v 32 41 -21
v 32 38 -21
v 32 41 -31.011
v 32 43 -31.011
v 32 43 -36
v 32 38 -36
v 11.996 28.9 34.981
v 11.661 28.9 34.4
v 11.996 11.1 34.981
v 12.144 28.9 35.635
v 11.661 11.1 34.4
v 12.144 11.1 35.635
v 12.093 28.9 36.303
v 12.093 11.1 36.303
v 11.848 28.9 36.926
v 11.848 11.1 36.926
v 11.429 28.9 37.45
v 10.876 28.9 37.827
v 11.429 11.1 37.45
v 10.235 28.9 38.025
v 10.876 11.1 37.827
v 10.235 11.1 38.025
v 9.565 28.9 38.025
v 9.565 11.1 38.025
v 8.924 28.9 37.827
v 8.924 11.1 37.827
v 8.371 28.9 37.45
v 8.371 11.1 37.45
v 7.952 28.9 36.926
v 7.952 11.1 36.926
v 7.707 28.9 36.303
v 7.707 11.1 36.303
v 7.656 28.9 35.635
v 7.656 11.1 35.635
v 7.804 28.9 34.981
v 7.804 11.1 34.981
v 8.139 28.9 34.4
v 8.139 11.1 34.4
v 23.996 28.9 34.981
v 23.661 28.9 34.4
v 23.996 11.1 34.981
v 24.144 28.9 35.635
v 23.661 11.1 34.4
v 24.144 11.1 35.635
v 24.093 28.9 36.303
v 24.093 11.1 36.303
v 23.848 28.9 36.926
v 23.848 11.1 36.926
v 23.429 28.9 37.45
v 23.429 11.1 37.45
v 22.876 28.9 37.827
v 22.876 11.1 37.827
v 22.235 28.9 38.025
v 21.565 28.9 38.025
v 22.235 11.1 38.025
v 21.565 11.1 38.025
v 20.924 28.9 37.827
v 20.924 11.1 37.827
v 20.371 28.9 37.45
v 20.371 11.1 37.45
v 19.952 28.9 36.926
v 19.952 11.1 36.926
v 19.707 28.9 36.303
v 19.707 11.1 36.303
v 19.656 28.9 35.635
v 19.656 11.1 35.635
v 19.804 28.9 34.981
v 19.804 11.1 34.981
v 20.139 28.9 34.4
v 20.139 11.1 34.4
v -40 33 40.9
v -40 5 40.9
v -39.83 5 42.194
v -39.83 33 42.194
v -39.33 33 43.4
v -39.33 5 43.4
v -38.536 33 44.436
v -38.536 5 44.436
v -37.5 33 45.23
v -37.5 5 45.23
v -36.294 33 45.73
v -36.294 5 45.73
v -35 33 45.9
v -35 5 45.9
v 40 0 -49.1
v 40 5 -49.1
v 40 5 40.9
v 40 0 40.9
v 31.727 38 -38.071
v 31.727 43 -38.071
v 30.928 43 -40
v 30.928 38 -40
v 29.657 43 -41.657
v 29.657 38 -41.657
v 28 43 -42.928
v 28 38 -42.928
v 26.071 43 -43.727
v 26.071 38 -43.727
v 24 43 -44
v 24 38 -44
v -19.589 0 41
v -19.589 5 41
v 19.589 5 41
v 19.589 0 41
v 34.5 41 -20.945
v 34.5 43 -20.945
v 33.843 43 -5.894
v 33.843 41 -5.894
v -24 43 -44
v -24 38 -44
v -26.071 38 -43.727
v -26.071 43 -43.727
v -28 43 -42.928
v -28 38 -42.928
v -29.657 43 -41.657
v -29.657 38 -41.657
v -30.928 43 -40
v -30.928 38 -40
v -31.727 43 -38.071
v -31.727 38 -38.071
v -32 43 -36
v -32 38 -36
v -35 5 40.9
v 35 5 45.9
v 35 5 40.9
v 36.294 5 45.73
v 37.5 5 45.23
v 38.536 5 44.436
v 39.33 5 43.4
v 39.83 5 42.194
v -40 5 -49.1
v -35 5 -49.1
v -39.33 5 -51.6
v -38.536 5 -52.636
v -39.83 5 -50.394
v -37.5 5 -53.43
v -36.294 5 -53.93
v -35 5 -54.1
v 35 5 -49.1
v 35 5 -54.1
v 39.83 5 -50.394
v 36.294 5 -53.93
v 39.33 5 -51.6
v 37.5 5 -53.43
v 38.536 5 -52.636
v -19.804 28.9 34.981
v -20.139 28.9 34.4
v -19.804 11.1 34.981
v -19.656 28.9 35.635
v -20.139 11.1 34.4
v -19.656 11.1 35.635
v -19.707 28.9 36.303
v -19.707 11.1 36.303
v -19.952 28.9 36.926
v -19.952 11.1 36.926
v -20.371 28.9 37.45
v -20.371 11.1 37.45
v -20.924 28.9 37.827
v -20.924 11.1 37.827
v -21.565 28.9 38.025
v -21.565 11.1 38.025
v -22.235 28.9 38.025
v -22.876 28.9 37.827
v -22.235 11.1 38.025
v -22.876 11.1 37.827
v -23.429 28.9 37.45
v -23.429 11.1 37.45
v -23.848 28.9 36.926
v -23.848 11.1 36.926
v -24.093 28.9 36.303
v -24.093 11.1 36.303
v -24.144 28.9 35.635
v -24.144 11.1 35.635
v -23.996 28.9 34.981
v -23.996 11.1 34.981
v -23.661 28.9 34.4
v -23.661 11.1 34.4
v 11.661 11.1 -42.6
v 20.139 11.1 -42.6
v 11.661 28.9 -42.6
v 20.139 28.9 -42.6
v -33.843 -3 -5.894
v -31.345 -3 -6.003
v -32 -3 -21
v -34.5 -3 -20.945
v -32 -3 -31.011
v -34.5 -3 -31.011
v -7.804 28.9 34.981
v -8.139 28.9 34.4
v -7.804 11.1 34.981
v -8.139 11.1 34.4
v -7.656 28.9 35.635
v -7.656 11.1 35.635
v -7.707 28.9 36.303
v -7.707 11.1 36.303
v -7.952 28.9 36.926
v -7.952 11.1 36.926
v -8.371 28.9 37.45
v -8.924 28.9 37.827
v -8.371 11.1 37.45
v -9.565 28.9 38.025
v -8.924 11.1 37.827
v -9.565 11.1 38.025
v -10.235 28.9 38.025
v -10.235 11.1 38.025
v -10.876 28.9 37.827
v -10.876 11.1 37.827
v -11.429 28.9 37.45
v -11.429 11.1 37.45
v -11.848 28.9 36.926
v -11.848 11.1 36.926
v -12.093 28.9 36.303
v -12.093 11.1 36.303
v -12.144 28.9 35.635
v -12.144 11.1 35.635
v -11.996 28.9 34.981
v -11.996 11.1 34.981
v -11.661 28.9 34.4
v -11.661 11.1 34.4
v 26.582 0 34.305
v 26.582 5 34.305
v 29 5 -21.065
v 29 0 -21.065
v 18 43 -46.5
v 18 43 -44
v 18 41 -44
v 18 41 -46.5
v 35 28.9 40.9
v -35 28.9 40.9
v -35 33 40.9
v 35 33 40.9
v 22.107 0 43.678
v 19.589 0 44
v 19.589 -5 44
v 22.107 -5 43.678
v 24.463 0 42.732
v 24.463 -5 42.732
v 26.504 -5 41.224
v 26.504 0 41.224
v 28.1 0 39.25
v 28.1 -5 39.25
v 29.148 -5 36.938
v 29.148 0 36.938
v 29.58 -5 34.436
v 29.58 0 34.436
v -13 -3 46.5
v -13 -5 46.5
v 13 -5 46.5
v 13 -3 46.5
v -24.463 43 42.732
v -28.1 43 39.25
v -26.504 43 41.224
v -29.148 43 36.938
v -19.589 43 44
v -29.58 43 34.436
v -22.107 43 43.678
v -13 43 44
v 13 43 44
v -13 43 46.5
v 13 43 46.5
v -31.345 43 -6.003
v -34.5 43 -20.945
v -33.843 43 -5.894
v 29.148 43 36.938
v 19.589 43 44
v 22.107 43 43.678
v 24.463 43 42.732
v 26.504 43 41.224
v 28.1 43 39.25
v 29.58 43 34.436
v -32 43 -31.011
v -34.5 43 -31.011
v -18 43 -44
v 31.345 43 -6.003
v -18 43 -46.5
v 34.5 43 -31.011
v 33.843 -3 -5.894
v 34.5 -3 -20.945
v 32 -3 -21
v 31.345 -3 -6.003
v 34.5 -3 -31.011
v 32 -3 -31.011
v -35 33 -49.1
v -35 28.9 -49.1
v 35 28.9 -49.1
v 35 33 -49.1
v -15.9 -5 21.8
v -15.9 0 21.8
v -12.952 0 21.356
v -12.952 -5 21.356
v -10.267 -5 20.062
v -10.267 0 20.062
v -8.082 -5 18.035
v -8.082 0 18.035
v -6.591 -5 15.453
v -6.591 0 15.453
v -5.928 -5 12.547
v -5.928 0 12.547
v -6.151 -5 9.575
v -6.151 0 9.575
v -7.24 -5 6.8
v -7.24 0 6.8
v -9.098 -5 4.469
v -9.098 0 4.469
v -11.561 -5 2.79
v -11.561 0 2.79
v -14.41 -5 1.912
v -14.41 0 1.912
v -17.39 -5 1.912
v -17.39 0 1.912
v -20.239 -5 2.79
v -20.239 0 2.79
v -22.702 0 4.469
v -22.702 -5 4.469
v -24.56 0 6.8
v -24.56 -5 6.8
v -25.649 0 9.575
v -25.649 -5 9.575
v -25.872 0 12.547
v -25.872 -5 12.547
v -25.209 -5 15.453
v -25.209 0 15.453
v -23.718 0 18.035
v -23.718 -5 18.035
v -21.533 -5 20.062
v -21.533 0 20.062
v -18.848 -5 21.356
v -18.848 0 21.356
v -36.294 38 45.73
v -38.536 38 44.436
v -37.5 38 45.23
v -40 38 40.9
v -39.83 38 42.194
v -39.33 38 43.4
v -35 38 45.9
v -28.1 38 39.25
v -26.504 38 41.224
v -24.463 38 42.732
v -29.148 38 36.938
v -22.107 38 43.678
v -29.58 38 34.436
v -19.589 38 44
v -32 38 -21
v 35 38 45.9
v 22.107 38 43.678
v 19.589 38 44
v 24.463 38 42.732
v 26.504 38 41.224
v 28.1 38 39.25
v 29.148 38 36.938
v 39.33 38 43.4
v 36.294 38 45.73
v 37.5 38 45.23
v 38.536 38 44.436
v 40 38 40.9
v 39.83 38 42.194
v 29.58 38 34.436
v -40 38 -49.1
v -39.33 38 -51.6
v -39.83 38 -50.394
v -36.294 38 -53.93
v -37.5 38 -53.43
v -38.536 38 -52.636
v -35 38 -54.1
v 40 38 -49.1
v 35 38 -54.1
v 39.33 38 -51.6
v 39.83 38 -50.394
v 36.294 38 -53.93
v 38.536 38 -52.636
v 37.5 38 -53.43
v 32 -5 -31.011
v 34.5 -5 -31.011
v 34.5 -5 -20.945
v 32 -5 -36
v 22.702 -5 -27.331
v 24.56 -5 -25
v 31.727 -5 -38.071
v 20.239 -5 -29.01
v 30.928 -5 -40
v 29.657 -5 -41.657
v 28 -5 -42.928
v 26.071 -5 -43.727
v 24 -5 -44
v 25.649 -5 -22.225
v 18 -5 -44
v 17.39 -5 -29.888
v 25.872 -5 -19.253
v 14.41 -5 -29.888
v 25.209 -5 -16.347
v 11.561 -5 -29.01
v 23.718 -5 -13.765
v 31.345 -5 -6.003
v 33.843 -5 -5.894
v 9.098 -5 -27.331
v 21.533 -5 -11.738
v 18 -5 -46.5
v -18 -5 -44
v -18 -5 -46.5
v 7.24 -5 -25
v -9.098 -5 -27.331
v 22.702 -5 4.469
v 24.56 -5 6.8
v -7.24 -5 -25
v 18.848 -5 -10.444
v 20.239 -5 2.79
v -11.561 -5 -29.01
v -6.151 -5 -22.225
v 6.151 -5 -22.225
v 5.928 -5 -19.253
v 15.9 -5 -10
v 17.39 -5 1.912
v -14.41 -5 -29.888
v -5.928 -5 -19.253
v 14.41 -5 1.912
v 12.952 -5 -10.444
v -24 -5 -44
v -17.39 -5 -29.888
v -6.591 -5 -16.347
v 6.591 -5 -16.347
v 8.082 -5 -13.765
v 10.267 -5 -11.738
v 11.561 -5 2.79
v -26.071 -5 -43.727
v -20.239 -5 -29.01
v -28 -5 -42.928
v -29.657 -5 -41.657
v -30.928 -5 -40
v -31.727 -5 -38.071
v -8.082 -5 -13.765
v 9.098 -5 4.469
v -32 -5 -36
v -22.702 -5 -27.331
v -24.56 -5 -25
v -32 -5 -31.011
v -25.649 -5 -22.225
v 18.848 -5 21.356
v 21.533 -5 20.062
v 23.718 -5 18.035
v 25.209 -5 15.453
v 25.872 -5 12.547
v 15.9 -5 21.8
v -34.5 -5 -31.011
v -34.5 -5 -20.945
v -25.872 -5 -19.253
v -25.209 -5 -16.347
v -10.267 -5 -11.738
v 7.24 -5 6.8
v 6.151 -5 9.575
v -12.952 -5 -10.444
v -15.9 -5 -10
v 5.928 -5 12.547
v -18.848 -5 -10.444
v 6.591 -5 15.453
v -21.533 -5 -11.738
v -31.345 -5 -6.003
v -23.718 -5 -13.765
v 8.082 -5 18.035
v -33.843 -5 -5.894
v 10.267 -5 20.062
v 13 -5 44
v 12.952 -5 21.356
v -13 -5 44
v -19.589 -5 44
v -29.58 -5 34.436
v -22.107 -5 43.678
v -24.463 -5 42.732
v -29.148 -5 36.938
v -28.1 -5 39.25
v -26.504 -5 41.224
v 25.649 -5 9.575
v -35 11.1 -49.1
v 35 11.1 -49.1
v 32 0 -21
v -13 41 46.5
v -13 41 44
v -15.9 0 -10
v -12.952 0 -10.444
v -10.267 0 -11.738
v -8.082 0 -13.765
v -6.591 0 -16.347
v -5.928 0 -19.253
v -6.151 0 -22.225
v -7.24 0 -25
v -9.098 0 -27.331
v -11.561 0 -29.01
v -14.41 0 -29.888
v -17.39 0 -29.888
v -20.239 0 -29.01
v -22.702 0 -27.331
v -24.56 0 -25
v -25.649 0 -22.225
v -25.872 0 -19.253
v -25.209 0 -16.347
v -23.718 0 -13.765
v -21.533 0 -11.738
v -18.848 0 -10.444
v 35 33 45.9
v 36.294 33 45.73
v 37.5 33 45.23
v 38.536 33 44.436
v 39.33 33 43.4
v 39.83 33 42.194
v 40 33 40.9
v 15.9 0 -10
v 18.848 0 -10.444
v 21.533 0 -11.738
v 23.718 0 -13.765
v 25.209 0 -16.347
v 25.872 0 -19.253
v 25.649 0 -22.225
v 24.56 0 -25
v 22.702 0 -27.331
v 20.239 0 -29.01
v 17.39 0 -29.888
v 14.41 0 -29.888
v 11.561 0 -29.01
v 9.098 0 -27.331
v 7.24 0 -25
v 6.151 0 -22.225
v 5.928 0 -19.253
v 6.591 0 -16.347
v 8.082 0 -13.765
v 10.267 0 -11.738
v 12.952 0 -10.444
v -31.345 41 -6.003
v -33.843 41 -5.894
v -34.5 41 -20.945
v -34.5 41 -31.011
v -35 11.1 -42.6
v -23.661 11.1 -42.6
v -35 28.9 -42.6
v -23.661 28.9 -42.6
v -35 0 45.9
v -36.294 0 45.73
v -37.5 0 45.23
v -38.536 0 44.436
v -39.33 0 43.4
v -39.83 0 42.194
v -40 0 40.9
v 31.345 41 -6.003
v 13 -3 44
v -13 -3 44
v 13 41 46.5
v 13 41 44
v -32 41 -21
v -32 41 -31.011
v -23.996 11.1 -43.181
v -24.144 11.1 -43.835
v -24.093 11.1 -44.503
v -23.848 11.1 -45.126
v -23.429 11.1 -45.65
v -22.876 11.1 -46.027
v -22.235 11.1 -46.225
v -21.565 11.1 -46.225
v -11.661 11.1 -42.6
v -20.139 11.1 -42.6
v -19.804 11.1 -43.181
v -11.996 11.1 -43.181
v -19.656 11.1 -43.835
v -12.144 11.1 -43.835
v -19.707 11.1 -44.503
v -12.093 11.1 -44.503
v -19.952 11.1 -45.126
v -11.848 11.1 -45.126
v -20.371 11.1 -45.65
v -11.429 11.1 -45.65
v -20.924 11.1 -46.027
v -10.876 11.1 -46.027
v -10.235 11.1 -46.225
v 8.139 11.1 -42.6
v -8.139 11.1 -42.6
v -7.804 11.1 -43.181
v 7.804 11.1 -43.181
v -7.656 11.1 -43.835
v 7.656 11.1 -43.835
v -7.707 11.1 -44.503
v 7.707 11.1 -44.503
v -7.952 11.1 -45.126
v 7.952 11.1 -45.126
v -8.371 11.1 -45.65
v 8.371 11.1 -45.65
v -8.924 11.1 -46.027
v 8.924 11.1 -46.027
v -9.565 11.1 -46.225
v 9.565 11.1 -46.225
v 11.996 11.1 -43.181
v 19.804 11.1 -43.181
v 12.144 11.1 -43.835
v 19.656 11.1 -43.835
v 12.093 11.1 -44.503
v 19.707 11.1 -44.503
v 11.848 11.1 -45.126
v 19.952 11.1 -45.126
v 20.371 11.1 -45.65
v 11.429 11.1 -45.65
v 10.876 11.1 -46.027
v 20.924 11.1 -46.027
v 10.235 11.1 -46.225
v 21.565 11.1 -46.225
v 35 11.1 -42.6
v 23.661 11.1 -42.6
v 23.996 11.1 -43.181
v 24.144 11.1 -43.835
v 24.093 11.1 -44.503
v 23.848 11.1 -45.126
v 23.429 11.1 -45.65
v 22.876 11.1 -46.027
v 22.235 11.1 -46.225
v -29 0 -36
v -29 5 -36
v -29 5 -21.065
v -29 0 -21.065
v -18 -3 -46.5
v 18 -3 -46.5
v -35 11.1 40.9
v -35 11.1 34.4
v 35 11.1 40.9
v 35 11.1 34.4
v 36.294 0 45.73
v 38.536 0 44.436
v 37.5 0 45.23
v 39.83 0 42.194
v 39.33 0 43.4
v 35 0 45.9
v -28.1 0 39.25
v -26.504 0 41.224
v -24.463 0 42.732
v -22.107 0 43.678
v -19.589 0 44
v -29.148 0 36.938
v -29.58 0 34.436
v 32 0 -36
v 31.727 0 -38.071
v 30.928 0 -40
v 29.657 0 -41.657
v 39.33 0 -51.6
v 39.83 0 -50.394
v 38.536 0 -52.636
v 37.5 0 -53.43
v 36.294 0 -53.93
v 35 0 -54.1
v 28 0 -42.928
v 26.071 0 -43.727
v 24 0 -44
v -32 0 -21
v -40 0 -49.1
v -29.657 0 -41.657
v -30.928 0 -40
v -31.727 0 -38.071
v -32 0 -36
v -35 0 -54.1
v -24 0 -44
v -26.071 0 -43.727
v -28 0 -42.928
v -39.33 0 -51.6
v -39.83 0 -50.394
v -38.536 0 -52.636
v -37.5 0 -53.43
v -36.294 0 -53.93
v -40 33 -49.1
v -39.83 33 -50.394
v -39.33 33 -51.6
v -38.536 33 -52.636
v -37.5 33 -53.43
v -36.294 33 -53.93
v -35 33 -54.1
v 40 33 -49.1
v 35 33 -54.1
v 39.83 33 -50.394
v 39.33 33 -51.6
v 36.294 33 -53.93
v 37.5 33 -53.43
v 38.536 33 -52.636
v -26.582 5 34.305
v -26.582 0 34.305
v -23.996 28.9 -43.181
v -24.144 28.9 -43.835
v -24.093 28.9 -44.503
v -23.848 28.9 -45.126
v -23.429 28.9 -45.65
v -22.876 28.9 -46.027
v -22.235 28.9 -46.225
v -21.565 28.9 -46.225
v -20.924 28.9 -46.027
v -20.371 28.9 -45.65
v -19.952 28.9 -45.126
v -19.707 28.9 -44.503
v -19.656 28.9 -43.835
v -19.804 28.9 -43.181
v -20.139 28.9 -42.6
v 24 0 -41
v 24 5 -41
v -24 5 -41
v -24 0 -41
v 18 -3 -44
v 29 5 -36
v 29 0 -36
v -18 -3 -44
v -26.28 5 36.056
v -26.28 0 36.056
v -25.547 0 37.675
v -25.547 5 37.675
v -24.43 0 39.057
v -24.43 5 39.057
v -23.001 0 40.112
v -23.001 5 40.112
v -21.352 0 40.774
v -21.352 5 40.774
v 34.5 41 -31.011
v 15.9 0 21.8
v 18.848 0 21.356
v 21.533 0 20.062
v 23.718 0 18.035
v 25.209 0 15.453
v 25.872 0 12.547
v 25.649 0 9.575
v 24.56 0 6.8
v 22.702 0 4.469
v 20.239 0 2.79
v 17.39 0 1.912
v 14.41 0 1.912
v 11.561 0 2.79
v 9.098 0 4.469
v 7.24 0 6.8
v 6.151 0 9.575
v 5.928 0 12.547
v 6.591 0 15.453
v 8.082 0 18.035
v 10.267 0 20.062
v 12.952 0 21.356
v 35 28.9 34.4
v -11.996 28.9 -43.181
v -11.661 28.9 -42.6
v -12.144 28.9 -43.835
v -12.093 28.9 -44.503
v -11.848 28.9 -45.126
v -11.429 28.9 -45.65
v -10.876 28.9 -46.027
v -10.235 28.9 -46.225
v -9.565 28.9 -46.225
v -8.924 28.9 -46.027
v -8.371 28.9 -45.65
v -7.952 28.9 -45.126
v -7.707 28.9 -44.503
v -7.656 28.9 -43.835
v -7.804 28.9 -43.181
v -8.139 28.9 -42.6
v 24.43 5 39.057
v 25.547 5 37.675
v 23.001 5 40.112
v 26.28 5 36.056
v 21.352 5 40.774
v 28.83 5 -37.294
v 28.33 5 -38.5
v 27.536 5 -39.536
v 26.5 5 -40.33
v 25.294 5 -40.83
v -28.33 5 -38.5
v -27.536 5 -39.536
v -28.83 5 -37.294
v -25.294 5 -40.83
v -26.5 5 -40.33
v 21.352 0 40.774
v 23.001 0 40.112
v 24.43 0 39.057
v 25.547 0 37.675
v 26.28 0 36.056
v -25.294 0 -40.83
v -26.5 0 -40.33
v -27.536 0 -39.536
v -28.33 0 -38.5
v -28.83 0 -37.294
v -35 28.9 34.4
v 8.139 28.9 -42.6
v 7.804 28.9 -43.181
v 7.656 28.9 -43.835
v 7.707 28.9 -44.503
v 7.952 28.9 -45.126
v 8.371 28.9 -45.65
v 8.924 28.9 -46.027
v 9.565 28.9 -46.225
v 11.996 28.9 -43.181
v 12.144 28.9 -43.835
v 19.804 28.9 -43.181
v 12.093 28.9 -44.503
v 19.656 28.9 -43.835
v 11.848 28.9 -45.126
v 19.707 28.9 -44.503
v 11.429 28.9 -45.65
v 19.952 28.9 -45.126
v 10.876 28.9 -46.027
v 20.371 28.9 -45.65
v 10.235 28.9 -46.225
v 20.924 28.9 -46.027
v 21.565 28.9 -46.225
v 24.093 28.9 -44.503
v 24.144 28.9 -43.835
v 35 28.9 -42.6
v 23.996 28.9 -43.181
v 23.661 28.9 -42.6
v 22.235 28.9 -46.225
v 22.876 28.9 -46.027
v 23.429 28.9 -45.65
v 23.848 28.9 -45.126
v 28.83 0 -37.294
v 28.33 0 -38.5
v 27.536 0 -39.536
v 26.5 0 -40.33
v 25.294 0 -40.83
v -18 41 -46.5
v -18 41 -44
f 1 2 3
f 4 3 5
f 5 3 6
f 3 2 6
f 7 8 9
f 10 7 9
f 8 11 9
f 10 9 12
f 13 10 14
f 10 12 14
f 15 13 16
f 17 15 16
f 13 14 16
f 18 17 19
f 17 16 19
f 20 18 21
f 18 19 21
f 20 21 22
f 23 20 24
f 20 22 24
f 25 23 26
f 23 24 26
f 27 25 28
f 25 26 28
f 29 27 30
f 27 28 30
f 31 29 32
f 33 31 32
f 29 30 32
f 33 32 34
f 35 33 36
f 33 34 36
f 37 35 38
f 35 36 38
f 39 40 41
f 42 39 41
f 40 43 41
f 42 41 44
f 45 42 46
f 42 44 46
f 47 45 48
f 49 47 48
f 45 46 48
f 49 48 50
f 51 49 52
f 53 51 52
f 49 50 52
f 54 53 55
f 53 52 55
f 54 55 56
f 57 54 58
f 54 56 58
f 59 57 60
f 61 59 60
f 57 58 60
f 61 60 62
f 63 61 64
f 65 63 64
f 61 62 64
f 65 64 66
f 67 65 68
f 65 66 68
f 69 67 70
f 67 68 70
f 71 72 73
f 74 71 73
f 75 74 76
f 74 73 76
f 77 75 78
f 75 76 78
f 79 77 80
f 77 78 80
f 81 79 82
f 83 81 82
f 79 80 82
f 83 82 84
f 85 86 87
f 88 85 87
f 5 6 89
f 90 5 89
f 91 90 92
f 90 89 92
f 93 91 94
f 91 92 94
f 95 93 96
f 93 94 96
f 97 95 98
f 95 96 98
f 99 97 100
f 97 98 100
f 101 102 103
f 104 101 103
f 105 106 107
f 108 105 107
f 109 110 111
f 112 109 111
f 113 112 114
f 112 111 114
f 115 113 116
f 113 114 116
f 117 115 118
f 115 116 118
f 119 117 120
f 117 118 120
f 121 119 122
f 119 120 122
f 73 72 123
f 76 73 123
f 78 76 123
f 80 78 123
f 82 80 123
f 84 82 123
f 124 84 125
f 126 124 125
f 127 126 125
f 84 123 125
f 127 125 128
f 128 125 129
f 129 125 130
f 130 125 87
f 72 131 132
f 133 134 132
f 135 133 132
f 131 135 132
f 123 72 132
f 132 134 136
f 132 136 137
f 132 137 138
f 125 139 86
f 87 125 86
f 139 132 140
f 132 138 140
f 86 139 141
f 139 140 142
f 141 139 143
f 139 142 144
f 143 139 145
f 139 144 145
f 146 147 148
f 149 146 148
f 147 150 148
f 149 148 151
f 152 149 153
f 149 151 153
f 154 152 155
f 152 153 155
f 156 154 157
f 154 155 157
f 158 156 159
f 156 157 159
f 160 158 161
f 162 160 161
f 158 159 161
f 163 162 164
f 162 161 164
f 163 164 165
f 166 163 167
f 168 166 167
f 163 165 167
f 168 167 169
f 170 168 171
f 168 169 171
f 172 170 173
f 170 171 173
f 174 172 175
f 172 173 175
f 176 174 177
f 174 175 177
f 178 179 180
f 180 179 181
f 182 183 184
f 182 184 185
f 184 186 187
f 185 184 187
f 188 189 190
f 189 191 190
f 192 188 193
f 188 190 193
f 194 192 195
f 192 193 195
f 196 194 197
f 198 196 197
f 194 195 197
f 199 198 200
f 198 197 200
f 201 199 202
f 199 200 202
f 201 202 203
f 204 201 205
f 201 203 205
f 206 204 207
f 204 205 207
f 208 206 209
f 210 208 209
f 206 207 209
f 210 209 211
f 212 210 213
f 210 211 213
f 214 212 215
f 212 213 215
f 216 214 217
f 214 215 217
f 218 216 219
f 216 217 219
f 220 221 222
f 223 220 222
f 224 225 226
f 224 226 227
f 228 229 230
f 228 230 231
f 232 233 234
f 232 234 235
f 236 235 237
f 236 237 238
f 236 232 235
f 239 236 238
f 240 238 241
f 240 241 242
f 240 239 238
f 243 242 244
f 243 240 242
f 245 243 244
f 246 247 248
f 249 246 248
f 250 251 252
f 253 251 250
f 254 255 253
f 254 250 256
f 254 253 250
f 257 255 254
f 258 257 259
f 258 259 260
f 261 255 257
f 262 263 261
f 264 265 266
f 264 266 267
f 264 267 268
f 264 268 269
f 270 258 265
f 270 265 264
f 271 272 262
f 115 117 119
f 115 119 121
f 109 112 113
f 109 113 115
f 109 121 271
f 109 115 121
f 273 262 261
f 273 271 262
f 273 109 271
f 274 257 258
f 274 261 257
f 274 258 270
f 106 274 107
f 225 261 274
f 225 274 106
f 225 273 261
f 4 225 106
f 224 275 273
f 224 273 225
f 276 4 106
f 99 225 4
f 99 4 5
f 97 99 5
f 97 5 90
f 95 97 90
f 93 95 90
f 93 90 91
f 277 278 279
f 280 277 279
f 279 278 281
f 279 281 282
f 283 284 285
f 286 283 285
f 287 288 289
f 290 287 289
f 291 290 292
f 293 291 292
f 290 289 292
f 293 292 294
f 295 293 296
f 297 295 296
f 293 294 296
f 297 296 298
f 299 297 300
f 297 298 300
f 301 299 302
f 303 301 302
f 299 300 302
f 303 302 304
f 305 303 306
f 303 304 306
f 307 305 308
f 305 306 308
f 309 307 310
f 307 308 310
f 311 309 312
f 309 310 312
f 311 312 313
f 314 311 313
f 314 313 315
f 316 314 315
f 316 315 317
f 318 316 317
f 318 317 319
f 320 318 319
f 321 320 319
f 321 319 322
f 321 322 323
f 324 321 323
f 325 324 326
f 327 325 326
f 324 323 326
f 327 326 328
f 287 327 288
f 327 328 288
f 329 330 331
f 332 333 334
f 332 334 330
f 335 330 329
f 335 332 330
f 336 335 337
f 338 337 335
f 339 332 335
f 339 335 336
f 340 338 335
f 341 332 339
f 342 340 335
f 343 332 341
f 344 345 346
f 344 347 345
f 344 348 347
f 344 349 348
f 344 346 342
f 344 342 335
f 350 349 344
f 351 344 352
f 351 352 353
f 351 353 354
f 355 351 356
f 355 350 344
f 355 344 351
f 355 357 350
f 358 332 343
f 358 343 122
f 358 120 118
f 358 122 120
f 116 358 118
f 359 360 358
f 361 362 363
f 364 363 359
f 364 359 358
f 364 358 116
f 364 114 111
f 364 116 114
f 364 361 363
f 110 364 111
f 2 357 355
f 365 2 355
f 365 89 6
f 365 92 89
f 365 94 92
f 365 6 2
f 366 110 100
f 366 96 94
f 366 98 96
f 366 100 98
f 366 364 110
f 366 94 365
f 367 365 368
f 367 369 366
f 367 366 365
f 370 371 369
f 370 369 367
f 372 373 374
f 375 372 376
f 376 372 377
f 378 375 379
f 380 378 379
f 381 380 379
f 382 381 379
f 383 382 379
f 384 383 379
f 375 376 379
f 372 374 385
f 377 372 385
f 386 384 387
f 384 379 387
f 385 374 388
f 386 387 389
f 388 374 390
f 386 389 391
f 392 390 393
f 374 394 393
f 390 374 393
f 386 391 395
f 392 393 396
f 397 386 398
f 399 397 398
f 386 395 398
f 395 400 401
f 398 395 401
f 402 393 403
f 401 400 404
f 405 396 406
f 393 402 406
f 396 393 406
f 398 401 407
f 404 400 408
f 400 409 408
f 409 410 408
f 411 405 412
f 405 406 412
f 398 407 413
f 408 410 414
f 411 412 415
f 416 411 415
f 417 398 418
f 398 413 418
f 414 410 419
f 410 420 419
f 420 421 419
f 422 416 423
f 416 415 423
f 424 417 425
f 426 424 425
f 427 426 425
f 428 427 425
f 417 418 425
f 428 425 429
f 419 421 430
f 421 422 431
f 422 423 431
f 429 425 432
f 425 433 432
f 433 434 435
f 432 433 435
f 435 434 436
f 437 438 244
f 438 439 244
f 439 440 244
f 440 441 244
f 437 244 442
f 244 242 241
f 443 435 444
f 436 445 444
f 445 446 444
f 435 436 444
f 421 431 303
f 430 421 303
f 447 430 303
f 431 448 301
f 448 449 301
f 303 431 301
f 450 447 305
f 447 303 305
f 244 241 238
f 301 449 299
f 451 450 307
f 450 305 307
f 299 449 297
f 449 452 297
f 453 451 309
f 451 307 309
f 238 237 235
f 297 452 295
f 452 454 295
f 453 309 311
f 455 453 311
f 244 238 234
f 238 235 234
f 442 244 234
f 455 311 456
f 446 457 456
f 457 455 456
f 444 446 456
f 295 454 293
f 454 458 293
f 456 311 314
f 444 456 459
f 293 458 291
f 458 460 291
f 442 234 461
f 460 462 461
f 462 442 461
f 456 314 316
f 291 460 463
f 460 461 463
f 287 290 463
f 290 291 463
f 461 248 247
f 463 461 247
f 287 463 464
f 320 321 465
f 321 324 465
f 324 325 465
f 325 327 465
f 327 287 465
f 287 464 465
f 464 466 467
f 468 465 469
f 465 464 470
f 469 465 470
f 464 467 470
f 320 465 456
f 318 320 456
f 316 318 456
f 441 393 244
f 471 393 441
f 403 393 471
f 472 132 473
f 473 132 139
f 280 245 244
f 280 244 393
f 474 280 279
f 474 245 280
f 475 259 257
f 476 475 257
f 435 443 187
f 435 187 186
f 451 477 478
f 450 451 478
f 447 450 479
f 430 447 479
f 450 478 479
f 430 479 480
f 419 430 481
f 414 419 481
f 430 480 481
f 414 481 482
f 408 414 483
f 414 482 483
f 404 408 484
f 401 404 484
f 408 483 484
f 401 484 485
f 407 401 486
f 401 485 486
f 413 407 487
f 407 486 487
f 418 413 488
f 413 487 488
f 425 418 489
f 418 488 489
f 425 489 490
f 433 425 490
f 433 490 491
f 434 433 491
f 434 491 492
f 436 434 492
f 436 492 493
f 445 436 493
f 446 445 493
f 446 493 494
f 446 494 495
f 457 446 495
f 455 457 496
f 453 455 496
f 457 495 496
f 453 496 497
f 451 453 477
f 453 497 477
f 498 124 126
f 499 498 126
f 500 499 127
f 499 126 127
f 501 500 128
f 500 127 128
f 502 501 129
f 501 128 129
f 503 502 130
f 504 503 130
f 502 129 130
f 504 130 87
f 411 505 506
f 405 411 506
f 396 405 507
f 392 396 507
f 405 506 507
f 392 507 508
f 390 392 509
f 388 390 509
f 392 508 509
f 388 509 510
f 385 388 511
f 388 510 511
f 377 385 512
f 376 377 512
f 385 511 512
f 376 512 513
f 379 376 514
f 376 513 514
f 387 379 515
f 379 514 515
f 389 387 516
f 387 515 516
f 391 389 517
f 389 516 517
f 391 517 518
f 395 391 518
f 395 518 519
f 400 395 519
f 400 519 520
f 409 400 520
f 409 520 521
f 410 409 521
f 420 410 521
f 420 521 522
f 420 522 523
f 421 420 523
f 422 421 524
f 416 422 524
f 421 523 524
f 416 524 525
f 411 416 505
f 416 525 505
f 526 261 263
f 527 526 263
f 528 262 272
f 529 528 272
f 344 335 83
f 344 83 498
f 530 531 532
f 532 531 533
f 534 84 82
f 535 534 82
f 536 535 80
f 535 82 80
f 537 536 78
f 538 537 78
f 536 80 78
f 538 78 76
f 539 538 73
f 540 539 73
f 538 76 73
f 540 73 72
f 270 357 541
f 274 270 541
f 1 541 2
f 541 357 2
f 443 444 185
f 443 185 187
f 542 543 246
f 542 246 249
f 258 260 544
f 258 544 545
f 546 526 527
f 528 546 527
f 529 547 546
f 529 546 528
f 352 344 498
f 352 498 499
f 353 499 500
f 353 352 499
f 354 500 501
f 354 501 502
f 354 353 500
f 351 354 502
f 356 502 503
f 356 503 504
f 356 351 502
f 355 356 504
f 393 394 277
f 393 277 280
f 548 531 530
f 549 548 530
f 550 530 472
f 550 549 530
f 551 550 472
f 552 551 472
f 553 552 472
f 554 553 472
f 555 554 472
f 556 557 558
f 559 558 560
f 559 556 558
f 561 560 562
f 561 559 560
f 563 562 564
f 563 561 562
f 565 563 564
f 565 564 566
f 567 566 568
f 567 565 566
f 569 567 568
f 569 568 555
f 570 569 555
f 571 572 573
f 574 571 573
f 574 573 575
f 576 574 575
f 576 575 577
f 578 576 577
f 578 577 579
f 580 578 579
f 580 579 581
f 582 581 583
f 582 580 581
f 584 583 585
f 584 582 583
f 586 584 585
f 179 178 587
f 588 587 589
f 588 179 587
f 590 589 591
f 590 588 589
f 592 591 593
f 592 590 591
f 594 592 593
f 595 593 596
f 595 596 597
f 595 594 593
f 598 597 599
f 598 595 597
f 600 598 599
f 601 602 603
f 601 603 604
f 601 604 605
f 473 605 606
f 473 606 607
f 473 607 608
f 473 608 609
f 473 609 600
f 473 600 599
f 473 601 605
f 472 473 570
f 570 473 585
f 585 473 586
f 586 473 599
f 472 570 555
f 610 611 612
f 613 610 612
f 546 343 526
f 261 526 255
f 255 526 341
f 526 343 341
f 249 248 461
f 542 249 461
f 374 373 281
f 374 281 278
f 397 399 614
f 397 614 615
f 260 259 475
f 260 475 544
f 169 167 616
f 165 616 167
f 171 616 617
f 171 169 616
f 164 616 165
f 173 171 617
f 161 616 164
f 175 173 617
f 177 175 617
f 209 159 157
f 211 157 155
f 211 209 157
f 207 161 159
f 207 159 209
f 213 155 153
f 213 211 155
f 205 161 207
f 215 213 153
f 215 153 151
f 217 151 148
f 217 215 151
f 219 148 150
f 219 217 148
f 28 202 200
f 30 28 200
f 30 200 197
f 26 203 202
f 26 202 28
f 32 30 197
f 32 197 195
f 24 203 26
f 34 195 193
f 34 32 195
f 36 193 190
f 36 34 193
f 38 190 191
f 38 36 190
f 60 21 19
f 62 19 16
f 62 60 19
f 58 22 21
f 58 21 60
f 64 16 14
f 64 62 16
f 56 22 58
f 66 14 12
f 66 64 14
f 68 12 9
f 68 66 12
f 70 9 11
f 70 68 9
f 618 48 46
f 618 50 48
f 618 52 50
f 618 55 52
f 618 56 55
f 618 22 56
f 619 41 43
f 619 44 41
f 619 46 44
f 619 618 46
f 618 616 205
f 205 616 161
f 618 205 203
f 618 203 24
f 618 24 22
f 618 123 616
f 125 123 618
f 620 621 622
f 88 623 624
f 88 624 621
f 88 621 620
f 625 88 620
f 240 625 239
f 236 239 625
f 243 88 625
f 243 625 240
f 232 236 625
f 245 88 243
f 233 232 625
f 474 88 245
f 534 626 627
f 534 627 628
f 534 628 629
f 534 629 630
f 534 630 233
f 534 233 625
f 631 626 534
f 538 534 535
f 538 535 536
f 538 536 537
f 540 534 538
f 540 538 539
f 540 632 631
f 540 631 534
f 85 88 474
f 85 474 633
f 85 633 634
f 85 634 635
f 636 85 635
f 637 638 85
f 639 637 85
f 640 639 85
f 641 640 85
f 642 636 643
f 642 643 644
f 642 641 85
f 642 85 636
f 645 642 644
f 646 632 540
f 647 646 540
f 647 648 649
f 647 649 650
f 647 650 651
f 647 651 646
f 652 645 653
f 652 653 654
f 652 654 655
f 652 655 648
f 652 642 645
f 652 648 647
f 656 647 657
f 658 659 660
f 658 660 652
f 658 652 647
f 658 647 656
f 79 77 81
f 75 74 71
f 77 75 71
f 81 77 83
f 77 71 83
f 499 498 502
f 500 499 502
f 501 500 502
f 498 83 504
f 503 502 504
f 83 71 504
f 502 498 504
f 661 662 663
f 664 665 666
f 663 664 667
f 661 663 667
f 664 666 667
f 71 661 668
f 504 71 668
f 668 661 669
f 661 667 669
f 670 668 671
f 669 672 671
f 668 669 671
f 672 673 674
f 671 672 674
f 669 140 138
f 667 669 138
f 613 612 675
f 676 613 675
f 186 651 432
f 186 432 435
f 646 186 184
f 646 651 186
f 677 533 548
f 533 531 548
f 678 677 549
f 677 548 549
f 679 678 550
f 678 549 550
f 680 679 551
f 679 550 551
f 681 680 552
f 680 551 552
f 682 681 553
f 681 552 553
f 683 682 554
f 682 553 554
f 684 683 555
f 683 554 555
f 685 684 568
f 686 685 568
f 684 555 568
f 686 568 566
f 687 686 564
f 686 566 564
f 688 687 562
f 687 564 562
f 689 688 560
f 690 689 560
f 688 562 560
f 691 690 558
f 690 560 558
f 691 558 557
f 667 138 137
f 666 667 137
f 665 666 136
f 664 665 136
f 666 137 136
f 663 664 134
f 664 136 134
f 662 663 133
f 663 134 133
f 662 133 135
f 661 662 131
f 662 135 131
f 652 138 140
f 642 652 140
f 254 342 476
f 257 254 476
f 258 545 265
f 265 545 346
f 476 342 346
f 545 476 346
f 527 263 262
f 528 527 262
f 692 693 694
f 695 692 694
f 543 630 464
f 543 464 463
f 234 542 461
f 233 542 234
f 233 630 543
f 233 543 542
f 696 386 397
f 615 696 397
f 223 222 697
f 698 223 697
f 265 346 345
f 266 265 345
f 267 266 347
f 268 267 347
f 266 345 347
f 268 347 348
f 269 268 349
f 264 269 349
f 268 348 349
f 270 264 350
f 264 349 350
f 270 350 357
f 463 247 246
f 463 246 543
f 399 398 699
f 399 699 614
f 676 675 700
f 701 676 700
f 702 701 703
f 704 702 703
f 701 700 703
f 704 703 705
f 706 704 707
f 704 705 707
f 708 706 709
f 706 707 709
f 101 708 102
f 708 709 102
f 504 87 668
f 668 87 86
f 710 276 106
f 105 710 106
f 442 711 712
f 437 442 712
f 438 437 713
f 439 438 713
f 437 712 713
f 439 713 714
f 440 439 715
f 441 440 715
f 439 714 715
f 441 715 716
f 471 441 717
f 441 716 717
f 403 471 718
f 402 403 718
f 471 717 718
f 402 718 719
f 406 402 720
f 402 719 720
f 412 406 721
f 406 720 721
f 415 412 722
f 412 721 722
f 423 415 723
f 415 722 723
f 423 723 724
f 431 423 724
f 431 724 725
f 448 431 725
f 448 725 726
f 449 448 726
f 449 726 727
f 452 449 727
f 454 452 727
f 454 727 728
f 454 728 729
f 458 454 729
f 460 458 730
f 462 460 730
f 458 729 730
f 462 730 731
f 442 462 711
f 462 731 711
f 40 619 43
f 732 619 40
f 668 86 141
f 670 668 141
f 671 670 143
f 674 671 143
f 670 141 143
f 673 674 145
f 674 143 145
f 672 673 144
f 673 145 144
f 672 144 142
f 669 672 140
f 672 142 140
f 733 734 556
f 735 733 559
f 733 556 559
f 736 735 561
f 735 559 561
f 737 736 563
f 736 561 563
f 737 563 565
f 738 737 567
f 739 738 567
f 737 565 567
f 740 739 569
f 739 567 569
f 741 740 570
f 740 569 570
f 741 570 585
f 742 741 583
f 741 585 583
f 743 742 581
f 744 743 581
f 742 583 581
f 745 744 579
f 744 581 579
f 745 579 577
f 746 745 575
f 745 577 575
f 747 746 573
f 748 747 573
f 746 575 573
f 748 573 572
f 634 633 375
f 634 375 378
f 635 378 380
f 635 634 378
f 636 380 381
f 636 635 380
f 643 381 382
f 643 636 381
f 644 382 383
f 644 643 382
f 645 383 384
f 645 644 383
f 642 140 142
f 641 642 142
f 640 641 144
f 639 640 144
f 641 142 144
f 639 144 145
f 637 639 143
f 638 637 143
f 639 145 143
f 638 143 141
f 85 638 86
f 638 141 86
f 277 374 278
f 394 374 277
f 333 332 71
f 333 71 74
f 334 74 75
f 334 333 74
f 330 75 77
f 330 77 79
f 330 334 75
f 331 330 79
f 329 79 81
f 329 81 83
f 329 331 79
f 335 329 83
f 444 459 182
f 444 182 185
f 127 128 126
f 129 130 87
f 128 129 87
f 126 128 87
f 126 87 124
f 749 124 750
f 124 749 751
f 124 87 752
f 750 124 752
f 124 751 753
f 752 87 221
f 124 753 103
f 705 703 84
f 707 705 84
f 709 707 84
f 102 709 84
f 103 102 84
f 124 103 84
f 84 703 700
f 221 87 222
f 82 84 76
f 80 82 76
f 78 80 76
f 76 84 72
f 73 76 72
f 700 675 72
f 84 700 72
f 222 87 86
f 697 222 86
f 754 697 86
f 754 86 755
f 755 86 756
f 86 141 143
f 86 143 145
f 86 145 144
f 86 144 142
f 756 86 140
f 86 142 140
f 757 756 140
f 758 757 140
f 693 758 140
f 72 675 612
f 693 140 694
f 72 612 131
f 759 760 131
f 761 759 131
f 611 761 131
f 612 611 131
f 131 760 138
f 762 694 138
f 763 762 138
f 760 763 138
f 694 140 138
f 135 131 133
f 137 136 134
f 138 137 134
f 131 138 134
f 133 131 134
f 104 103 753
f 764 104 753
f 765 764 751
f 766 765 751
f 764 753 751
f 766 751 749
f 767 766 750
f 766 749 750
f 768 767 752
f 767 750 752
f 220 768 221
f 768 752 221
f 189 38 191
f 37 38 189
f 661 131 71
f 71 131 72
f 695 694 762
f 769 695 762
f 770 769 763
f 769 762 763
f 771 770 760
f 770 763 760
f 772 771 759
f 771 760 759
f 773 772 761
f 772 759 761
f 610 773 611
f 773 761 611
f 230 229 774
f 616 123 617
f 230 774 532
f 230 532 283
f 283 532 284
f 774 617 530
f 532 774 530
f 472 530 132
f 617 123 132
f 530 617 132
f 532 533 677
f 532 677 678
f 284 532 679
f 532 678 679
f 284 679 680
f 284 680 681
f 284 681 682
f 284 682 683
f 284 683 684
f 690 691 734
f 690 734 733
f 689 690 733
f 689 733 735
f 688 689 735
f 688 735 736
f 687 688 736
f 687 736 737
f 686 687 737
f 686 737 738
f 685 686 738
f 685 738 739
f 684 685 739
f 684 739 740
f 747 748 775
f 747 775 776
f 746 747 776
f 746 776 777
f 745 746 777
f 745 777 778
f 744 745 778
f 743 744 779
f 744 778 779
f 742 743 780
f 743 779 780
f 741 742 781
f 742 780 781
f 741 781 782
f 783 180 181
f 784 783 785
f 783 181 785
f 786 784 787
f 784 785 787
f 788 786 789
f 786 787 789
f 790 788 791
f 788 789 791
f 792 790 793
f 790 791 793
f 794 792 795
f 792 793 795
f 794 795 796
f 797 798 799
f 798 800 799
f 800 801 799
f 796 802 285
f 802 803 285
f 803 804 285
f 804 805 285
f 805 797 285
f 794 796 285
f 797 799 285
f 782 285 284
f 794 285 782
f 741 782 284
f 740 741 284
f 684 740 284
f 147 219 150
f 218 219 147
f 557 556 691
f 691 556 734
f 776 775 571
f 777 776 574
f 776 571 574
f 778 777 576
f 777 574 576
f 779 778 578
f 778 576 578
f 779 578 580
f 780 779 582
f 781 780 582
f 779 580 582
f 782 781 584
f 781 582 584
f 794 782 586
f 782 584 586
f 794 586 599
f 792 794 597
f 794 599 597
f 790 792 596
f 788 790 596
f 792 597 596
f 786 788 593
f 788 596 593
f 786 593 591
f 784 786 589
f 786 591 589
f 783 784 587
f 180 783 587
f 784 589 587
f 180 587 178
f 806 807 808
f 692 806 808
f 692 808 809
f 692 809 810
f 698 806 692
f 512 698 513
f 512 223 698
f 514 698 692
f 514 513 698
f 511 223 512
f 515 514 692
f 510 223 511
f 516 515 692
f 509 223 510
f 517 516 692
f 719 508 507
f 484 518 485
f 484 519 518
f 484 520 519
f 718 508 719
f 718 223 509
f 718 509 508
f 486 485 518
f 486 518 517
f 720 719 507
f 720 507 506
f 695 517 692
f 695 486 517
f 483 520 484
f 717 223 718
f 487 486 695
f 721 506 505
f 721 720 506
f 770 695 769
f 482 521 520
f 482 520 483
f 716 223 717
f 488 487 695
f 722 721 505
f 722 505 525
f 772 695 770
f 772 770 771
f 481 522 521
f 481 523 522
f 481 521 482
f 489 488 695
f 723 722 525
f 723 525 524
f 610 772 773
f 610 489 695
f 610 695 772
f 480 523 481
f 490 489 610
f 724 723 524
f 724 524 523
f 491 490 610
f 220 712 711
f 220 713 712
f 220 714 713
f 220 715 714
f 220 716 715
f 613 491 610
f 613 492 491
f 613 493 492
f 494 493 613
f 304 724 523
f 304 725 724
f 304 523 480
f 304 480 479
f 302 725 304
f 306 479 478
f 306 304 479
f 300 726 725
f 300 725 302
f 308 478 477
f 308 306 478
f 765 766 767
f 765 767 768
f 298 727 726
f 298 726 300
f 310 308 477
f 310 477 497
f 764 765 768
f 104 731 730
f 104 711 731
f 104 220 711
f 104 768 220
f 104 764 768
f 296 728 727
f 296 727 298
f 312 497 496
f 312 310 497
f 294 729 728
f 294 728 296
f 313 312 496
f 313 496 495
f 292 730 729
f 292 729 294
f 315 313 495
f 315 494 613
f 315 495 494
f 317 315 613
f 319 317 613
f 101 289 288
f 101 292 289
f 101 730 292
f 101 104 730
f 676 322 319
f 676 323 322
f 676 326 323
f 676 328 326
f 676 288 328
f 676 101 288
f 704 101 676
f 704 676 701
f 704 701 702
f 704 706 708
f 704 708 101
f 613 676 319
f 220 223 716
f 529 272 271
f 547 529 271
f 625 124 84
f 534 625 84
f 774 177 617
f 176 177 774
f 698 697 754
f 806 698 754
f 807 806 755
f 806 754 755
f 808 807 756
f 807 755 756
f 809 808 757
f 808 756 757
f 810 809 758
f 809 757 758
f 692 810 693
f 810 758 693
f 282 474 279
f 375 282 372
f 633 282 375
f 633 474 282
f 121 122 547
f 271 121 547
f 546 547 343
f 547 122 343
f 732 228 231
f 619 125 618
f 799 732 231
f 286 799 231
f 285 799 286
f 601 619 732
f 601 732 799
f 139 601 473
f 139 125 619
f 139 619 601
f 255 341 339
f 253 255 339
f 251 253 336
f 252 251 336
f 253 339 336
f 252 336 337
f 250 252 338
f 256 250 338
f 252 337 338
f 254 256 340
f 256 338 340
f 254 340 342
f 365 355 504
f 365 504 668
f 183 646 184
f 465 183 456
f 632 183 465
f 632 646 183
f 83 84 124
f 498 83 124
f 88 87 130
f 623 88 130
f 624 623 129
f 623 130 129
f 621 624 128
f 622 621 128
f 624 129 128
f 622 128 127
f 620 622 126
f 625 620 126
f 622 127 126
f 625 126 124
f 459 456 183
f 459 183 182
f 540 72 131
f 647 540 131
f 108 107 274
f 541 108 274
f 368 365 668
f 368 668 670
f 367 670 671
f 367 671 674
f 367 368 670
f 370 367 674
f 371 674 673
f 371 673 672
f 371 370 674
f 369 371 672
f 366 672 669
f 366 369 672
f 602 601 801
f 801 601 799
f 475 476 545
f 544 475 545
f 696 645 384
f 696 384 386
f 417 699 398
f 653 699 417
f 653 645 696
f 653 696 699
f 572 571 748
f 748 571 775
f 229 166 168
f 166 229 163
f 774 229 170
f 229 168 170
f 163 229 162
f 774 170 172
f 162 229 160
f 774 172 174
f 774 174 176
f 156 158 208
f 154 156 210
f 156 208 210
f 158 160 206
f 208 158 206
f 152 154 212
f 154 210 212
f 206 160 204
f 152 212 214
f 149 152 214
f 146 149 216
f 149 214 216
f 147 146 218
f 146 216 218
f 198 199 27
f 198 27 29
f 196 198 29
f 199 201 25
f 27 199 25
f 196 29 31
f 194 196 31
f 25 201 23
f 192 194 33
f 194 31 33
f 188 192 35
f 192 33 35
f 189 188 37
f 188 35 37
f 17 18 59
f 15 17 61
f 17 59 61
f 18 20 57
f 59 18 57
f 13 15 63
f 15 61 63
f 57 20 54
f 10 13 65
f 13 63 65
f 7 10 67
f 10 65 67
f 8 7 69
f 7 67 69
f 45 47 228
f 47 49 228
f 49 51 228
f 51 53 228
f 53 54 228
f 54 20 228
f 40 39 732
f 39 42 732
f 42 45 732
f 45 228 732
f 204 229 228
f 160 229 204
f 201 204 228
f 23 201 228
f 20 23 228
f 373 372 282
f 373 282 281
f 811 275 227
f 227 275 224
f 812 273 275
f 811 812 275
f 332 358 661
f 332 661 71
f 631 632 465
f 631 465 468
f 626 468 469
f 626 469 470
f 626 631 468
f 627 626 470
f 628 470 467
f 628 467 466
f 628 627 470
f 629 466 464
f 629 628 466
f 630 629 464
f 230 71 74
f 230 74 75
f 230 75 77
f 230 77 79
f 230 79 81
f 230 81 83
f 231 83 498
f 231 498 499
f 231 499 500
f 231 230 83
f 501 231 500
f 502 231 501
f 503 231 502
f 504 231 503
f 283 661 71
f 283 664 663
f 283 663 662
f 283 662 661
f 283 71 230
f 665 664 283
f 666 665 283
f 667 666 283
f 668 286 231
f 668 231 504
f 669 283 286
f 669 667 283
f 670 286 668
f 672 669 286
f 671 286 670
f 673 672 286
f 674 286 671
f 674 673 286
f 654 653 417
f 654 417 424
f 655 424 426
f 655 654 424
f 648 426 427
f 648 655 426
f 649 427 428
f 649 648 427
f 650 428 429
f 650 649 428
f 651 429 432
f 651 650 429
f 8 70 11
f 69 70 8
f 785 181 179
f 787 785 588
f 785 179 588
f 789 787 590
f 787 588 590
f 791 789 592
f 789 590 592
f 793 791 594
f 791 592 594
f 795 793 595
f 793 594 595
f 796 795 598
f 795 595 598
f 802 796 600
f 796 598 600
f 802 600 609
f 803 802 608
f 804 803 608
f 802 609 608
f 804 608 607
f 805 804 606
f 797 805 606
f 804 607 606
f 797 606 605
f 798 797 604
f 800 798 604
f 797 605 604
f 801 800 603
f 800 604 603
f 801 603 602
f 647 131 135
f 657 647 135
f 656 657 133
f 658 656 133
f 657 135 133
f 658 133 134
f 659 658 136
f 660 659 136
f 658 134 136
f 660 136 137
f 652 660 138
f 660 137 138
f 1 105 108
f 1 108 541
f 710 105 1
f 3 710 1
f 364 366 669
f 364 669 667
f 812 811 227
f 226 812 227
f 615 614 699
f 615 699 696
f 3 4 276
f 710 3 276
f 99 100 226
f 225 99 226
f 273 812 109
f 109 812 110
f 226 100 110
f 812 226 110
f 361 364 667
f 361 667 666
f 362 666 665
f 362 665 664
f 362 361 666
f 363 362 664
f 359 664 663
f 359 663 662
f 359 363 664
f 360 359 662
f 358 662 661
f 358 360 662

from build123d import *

# Parameters (mm, degrees)
SKETCH8_R                        = 10
BOSS_EXTRUDE6_DEPTH              = 5
BOSS_EXTRUDE7_START              = 5
BOSS_EXTRUDE7_DEPTH              = 5
EXTRUDE_THIN4_DEPTH              = 8
EXTRUDE_THIN4_DEPTH_BACK         = 20
SKETCH2_W                        = 70
SKETCH2_H                        = 90
BOSS_EXTRUDE8_DEPTH              = 5
BOSS_EXTRUDE9_DEPTH              = 5
BOSS_EXTRUDE10_REACH             = 81.849
SKETCH13_W                       = 6.5
SKETCH13_H                       = 17.8
BOSS_EXTRUDE10_DIRECTION_2_REACH = 81.849
SKETCH15_R                       = 2.25
CUT_EXTRUDE1_DEPTH               = 17.8
SKETCH17_W                       = 36
SKETCH17_H                       = 3
SKETCH17_W_2                     = 26
BOSS_EXTRUDE11_DEPTH             = 2
SKETCH18_W                       = 36
SKETCH18_H                       = 3
SKETCH18_W_2                     = 26
BOSS_EXTRUDE12_DEPTH             = 2


with BuildPart() as part:
    # Sketch8 → Boss-Extrude6 (new body)
    with BuildSketch(Plane(origin=(0, 0, 0), x_dir=(-1, 0, 0), z_dir=(0, 1, 0))):
        with BuildLine():
            Line((32, -36), (32, -21))
            Line((32, -21), (29.579603504, 34.436193874))
            ThreePointArc((29.579603504, 34.436193874), (26.504251846, 41.223639621), (19.589121288, 44))
            Line((19.589121288, 44), (-19.589121288, 44))
            ThreePointArc((-19.589121288, 44), (-26.504251846, 41.223639621), (-29.579603504, 34.436193874))
            Line((-29.579603504, 34.436193874), (-32, -21))
            Line((-32, -21), (-32, -36))
            ThreePointArc((-32, -36), (-29.656854249, -41.656854249), (-24, -44))
            Line((-24, -44), (24, -44))
            ThreePointArc((24, -44), (29.656854249, -41.656854249), (32, -36))
        make_face()
        with Locations(Location((15.9, 11.8, 0), (0, 0, 90))):
            Circle(SKETCH8_R, mode=Mode.SUBTRACT)
        with Locations(Location((-15.9, 11.8, 0), (0, 0, 90))):
            Circle(SKETCH8_R, mode=Mode.SUBTRACT)
        with Locations(Location((15.9, -20, 0), (0, 0, 90))):
            Circle(SKETCH8_R, mode=Mode.SUBTRACT)
        with Locations(Location((-15.9, -20, 0), (0, 0, 90))):
            Circle(SKETCH8_R, mode=Mode.SUBTRACT)
    extrude(amount=-BOSS_EXTRUDE6_DEPTH)

    # Sketch1 → Boss-Extrude7 (add)
    # profile 1 of 2: a face of its own
    with BuildSketch(Plane(origin=(0, 0, 0), x_dir=(1, 0, 0), z_dir=(0, 1, 0)).offset(BOSS_EXTRUDE7_START)):
        with BuildLine():
            Line((-35, 54.1), (35, 54.1))
            ThreePointArc((35, 54.1), (38.535533906, 52.635533906), (40, 49.1))
            Line((40, 49.1), (40, -40.9))
            ThreePointArc((40, -40.9), (38.535533906, -44.435533906), (35, -45.9))
            Line((35, -45.9), (-35, -45.9))
            ThreePointArc((-35, -45.9), (-38.535533906, -44.435533906), (-40, -40.9))
            Line((-40, -40.9), (-40, 49.1))
            ThreePointArc((-40, 49.1), (-38.535533906, 52.635533906), (-35, 54.1))
        make_face()
        with BuildLine():
            ThreePointArc((32, 36), (29.656854249, 41.656854249), (24, 44))
            Line((24, 44), (-24, 44))
            ThreePointArc((-24, 44), (-29.656854249, 41.656854249), (-32, 36))
            Line((-32, 36), (-32, 21))
            Line((-32, 21), (-29.579603504, -34.436193874))
            ThreePointArc((-29.579603504, -34.436193874), (-26.504251846, -41.223639621), (-19.589121288, -44))
            Line((-19.589121288, -44), (19.589121288, -44))
            ThreePointArc((19.589121288, -44), (26.504251846, -41.223639621), (29.579603504, -34.436193874))
            Line((29.579603504, -34.436193874), (32, 21))
            Line((32, 21), (32, 36))
        make_face(mode=Mode.SUBTRACT)
    # profile 2 of 2: a face of its own
    with BuildSketch(Plane(origin=(0, 0, 0), x_dir=(1, 0, 0), z_dir=(0, 1, 0)).offset(BOSS_EXTRUDE7_START)):
        with BuildLine():
            Line((32, 36), (32, 21))
            Line((32, 21), (29.579603504, -34.436193874))
            ThreePointArc((29.579603504, -34.436193874), (26.504251846, -41.223639621), (19.589121288, -44))
            Line((19.589121288, -44), (-19.589121288, -44))
            ThreePointArc((-19.589121288, -44), (-26.504251846, -41.223639621), (-29.579603504, -34.436193874))
            Line((-29.579603504, -34.436193874), (-32, 21))
            Line((-32, 21), (-32, 36))
            ThreePointArc((-32, 36), (-29.656854249, 41.656854249), (-24, 44))
            Line((-24, 44), (24, 44))
            ThreePointArc((24, 44), (29.656854249, 41.656854249), (32, 36))
        make_face()
        with BuildLine():
            ThreePointArc((-24, 41), (-27.535533906, 39.535533906), (-29, 36))
            Line((-29, 36), (-29, 21.065460233))
            Line((-29, 21.065460233), (-26.582458839, -34.305335712))
            ThreePointArc((-26.582458839, -34.305335712), (-24.429712679, -39.056547734), (-19.589121288, -41))
            Line((-19.589121288, -41), (19.589121288, -41))
            ThreePointArc((19.589121288, -41), (24.429712679, -39.056547734), (26.582458839, -34.305335712))
            Line((26.582458839, -34.305335712), (29, 21.065460233))
            Line((29, 21.065460233), (29, 36))
            ThreePointArc((29, 36), (27.535533906, 39.535533906), (24, 41))
            Line((24, 41), (-24, 41))
        make_face(mode=Mode.SUBTRACT)
    extrude(amount=-BOSS_EXTRUDE7_DEPTH)

    # Sketch17 → Boss-Extrude11 (add)
    with BuildSketch(Plane(origin=(0, -5, 0), x_dir=(1, 0, 0), z_dir=(0, 1, 0))):
        with Locations((0, 45)):
            Rectangle(SKETCH17_W, SKETCH17_H)
        with Locations((0, -45)):
            Rectangle(SKETCH17_W_2, SKETCH17_H)
        Polygon((-31.5, 21.010910039), (-30.84570919, 6.025186715), (-33.842853854, 5.894328553), (-34.5, 20.945449806), (-34.5, 31.010910039), (-31.5, 31.010910039), align=None)
        Polygon((31.5, 21.010910039), (31.5, 31.010910039), (34.5, 31.010910039), (34.5, 20.945449806), (33.842853854, 5.894328553), (30.84570919, 6.025186715), align=None)
    extrude(amount=BOSS_EXTRUDE11_DEPTH)


with BuildPart() as body_2:
    # Sketch2 → Extrude-Thin4 (new, two sides: drawn at the far end of the back side and taken through both)
    with BuildSketch(Plane(origin=(0, 25, 0), x_dir=(1, 0, 0), z_dir=(0, 1, 0)).offset(-EXTRUDE_THIN4_DEPTH_BACK)):
        with BuildLine():
            Line((-40, 49.1), (-40, -40.9))
            ThreePointArc((-40, -40.9), (-38.535533906, -44.435533906), (-35, -45.9))
            Line((-35, -45.9), (35, -45.9))
            ThreePointArc((35, -45.9), (38.535533906, -44.435533906), (40, -40.9))
            Line((40, -40.9), (40, 49.1))
            ThreePointArc((40, 49.1), (38.535533906, 52.635533906), (35, 54.1))
            Line((35, 54.1), (-35, 54.1))
            ThreePointArc((-35, 54.1), (-38.535533906, 52.635533906), (-40, 49.1))
        make_face()
        with Locations((0, 4.1)):
            Rectangle(SKETCH2_W, SKETCH2_H, mode=Mode.SUBTRACT)
    extrude(amount=EXTRUDE_THIN4_DEPTH + EXTRUDE_THIN4_DEPTH_BACK)

    # Sketch13 → Boss-Extrude10 (add, up to next)
    with BuildSketch(Plane(origin=(0, 0, 0), x_dir=(0, 0, -1), z_dir=(1, 0, 0)), mode=Mode.PRIVATE) as boss_extrude10_sk1:
        with Locations((45.85, 20)):
            Rectangle(SKETCH13_W, SKETCH13_H)
    boss_extrude10_tool1 = extrude(boss_extrude10_sk1.sketch, amount=BOSS_EXTRUDE10_REACH, mode=Mode.PRIVATE) - body_2.part
    # Sketch13 → Boss-Extrude10 (add, up to next)
    with BuildSketch(Plane(origin=(0, 0, 0), x_dir=(0, 0, -1), z_dir=(1, 0, 0)), mode=Mode.PRIVATE) as boss_extrude10_sk2:
        with Locations((-37.65, 20)):
            Rectangle(SKETCH13_W, SKETCH13_H)
    boss_extrude10_tool2 = extrude(boss_extrude10_sk2.sketch, amount=BOSS_EXTRUDE10_REACH, mode=Mode.PRIVATE) - body_2.part
    add(boss_extrude10_tool1.solids().sort_by_distance((0, 20, -45.85))[0])
    add(boss_extrude10_tool2.solids().sort_by_distance((0, 20, 37.65))[0])

    # Sketch13 → Boss-Extrude10 direction 2 (add, up to next)
    with BuildSketch(Plane(origin=(0, 0, 0), x_dir=(0, 0, -1), z_dir=(1, 0, 0)), mode=Mode.PRIVATE) as boss_extrude10_direction_2_sk1:
        with Locations((45.85, 20)):
            Rectangle(SKETCH13_W, SKETCH13_H)
    boss_extrude10_direction_2_tool1 = extrude(boss_extrude10_direction_2_sk1.sketch, amount=-BOSS_EXTRUDE10_DIRECTION_2_REACH, mode=Mode.PRIVATE) - body_2.part
    # Sketch13 → Boss-Extrude10 direction 2 (add, up to next)
    with BuildSketch(Plane(origin=(0, 0, 0), x_dir=(0, 0, -1), z_dir=(1, 0, 0)), mode=Mode.PRIVATE) as boss_extrude10_direction_2_sk2:
        with Locations((-37.65, 20)):
            Rectangle(SKETCH13_W, SKETCH13_H)
    boss_extrude10_direction_2_tool2 = extrude(boss_extrude10_direction_2_sk2.sketch, amount=-BOSS_EXTRUDE10_DIRECTION_2_REACH, mode=Mode.PRIVATE) - body_2.part
    add(boss_extrude10_direction_2_tool1.solids().sort_by_distance((0, 20, -45.85))[0])
    add(boss_extrude10_direction_2_tool2.solids().sort_by_distance((0, 20, 37.65))[0])

    # Sketch15 → Cut-Extrude1 (cut)
    with BuildSketch(Plane.XZ.offset(-11.1)):
        with Locations((-21.9, -44)):
            Circle(SKETCH15_R)
        with Locations((-9.9, -44)):
            Circle(SKETCH15_R)
        with Locations((-21.9, 35.8)):
            Circle(SKETCH15_R)
        with Locations((-9.9, 35.8)):
            Circle(SKETCH15_R)
        with Locations((9.9, 35.8)):
            Circle(SKETCH15_R)
        with Locations((21.9, 35.8)):
            Circle(SKETCH15_R)
        with Locations((9.9, -44)):
            Circle(SKETCH15_R)
        with Locations((21.9, -44)):
            Circle(SKETCH15_R)
    extrude(amount=-CUT_EXTRUDE1_DEPTH, mode=Mode.SUBTRACT)


with BuildPart() as body_3:
    # Sketch10 → Boss-Extrude8 (new body)
    with BuildSketch(Plane(origin=(0, 38, 0), x_dir=(1, 0, 0), z_dir=(0, 1, 0))):
        with BuildLine():
            Line((-32, 36), (-32, 21))
            Line((-32, 21), (-29.579603504, -34.436193874))
            ThreePointArc((-29.579603504, -34.436193874), (-26.504251846, -41.223639621), (-19.589121288, -44))
            Line((-19.589121288, -44), (19.589121288, -44))
            ThreePointArc((19.589121288, -44), (26.504251846, -41.223639621), (29.579603504, -34.436193874))
            Line((29.579603504, -34.436193874), (32, 21))
            Line((32, 21), (32, 36))
            ThreePointArc((32, 36), (29.656854249, 41.656854249), (24, 44))
            Line((24, 44), (-24, 44))
            ThreePointArc((-24, 44), (-29.656854249, 41.656854249), (-32, 36))
        make_face()
    extrude(amount=BOSS_EXTRUDE8_DEPTH)

    # Sketch11 → Boss-Extrude9 (add)
    with BuildSketch(Plane(origin=(0, 38, 0), x_dir=(1, 0, 0), z_dir=(0, 1, 0))):
        with BuildLine():
            Line((-35, -45.9), (35, -45.9))
            ThreePointArc((35, -45.9), (38.535533906, -44.435533906), (40, -40.9))
            Line((40, -40.9), (40, 49.1))
            ThreePointArc((40, 49.1), (38.535533906, 52.635533906), (35, 54.1))
            Line((35, 54.1), (-35, 54.1))
            ThreePointArc((-35, 54.1), (-38.535533906, 52.635533906), (-40, 49.1))
            Line((-40, 49.1), (-40, -40.9))
            ThreePointArc((-40, -40.9), (-38.535533906, -44.435533906), (-35, -45.9))
        make_face()
    extrude(amount=-BOSS_EXTRUDE9_DEPTH)

    # Sketch18 → Boss-Extrude12 (add)
    with BuildSketch(Plane(origin=(0, 43, 0), x_dir=(1, 0, 0), z_dir=(0, 1, 0))):
        with Locations((0, 45)):
            Rectangle(SKETCH18_W, SKETCH18_H)
        with Locations((0, -45)):
            Rectangle(SKETCH18_W_2, SKETCH18_H)
        Polygon((-31.5, 21.010910039), (-30.84570919, 6.025186715), (-33.842853854, 5.894328553), (-34.5, 20.945449806), (-34.5, 31.010910039), (-31.5, 31.010910039), align=None)
        Polygon((31.5, 21.010910039), (31.5, 31.010910039), (34.5, 31.010910039), (34.5, 20.945449806), (33.842853854, 5.894328553), (30.84570919, 6.025186715), align=None)
    extrude(amount=-BOSS_EXTRUDE12_DEPTH)


solid = Compound([part.part, body_2.part, body_3.part])
